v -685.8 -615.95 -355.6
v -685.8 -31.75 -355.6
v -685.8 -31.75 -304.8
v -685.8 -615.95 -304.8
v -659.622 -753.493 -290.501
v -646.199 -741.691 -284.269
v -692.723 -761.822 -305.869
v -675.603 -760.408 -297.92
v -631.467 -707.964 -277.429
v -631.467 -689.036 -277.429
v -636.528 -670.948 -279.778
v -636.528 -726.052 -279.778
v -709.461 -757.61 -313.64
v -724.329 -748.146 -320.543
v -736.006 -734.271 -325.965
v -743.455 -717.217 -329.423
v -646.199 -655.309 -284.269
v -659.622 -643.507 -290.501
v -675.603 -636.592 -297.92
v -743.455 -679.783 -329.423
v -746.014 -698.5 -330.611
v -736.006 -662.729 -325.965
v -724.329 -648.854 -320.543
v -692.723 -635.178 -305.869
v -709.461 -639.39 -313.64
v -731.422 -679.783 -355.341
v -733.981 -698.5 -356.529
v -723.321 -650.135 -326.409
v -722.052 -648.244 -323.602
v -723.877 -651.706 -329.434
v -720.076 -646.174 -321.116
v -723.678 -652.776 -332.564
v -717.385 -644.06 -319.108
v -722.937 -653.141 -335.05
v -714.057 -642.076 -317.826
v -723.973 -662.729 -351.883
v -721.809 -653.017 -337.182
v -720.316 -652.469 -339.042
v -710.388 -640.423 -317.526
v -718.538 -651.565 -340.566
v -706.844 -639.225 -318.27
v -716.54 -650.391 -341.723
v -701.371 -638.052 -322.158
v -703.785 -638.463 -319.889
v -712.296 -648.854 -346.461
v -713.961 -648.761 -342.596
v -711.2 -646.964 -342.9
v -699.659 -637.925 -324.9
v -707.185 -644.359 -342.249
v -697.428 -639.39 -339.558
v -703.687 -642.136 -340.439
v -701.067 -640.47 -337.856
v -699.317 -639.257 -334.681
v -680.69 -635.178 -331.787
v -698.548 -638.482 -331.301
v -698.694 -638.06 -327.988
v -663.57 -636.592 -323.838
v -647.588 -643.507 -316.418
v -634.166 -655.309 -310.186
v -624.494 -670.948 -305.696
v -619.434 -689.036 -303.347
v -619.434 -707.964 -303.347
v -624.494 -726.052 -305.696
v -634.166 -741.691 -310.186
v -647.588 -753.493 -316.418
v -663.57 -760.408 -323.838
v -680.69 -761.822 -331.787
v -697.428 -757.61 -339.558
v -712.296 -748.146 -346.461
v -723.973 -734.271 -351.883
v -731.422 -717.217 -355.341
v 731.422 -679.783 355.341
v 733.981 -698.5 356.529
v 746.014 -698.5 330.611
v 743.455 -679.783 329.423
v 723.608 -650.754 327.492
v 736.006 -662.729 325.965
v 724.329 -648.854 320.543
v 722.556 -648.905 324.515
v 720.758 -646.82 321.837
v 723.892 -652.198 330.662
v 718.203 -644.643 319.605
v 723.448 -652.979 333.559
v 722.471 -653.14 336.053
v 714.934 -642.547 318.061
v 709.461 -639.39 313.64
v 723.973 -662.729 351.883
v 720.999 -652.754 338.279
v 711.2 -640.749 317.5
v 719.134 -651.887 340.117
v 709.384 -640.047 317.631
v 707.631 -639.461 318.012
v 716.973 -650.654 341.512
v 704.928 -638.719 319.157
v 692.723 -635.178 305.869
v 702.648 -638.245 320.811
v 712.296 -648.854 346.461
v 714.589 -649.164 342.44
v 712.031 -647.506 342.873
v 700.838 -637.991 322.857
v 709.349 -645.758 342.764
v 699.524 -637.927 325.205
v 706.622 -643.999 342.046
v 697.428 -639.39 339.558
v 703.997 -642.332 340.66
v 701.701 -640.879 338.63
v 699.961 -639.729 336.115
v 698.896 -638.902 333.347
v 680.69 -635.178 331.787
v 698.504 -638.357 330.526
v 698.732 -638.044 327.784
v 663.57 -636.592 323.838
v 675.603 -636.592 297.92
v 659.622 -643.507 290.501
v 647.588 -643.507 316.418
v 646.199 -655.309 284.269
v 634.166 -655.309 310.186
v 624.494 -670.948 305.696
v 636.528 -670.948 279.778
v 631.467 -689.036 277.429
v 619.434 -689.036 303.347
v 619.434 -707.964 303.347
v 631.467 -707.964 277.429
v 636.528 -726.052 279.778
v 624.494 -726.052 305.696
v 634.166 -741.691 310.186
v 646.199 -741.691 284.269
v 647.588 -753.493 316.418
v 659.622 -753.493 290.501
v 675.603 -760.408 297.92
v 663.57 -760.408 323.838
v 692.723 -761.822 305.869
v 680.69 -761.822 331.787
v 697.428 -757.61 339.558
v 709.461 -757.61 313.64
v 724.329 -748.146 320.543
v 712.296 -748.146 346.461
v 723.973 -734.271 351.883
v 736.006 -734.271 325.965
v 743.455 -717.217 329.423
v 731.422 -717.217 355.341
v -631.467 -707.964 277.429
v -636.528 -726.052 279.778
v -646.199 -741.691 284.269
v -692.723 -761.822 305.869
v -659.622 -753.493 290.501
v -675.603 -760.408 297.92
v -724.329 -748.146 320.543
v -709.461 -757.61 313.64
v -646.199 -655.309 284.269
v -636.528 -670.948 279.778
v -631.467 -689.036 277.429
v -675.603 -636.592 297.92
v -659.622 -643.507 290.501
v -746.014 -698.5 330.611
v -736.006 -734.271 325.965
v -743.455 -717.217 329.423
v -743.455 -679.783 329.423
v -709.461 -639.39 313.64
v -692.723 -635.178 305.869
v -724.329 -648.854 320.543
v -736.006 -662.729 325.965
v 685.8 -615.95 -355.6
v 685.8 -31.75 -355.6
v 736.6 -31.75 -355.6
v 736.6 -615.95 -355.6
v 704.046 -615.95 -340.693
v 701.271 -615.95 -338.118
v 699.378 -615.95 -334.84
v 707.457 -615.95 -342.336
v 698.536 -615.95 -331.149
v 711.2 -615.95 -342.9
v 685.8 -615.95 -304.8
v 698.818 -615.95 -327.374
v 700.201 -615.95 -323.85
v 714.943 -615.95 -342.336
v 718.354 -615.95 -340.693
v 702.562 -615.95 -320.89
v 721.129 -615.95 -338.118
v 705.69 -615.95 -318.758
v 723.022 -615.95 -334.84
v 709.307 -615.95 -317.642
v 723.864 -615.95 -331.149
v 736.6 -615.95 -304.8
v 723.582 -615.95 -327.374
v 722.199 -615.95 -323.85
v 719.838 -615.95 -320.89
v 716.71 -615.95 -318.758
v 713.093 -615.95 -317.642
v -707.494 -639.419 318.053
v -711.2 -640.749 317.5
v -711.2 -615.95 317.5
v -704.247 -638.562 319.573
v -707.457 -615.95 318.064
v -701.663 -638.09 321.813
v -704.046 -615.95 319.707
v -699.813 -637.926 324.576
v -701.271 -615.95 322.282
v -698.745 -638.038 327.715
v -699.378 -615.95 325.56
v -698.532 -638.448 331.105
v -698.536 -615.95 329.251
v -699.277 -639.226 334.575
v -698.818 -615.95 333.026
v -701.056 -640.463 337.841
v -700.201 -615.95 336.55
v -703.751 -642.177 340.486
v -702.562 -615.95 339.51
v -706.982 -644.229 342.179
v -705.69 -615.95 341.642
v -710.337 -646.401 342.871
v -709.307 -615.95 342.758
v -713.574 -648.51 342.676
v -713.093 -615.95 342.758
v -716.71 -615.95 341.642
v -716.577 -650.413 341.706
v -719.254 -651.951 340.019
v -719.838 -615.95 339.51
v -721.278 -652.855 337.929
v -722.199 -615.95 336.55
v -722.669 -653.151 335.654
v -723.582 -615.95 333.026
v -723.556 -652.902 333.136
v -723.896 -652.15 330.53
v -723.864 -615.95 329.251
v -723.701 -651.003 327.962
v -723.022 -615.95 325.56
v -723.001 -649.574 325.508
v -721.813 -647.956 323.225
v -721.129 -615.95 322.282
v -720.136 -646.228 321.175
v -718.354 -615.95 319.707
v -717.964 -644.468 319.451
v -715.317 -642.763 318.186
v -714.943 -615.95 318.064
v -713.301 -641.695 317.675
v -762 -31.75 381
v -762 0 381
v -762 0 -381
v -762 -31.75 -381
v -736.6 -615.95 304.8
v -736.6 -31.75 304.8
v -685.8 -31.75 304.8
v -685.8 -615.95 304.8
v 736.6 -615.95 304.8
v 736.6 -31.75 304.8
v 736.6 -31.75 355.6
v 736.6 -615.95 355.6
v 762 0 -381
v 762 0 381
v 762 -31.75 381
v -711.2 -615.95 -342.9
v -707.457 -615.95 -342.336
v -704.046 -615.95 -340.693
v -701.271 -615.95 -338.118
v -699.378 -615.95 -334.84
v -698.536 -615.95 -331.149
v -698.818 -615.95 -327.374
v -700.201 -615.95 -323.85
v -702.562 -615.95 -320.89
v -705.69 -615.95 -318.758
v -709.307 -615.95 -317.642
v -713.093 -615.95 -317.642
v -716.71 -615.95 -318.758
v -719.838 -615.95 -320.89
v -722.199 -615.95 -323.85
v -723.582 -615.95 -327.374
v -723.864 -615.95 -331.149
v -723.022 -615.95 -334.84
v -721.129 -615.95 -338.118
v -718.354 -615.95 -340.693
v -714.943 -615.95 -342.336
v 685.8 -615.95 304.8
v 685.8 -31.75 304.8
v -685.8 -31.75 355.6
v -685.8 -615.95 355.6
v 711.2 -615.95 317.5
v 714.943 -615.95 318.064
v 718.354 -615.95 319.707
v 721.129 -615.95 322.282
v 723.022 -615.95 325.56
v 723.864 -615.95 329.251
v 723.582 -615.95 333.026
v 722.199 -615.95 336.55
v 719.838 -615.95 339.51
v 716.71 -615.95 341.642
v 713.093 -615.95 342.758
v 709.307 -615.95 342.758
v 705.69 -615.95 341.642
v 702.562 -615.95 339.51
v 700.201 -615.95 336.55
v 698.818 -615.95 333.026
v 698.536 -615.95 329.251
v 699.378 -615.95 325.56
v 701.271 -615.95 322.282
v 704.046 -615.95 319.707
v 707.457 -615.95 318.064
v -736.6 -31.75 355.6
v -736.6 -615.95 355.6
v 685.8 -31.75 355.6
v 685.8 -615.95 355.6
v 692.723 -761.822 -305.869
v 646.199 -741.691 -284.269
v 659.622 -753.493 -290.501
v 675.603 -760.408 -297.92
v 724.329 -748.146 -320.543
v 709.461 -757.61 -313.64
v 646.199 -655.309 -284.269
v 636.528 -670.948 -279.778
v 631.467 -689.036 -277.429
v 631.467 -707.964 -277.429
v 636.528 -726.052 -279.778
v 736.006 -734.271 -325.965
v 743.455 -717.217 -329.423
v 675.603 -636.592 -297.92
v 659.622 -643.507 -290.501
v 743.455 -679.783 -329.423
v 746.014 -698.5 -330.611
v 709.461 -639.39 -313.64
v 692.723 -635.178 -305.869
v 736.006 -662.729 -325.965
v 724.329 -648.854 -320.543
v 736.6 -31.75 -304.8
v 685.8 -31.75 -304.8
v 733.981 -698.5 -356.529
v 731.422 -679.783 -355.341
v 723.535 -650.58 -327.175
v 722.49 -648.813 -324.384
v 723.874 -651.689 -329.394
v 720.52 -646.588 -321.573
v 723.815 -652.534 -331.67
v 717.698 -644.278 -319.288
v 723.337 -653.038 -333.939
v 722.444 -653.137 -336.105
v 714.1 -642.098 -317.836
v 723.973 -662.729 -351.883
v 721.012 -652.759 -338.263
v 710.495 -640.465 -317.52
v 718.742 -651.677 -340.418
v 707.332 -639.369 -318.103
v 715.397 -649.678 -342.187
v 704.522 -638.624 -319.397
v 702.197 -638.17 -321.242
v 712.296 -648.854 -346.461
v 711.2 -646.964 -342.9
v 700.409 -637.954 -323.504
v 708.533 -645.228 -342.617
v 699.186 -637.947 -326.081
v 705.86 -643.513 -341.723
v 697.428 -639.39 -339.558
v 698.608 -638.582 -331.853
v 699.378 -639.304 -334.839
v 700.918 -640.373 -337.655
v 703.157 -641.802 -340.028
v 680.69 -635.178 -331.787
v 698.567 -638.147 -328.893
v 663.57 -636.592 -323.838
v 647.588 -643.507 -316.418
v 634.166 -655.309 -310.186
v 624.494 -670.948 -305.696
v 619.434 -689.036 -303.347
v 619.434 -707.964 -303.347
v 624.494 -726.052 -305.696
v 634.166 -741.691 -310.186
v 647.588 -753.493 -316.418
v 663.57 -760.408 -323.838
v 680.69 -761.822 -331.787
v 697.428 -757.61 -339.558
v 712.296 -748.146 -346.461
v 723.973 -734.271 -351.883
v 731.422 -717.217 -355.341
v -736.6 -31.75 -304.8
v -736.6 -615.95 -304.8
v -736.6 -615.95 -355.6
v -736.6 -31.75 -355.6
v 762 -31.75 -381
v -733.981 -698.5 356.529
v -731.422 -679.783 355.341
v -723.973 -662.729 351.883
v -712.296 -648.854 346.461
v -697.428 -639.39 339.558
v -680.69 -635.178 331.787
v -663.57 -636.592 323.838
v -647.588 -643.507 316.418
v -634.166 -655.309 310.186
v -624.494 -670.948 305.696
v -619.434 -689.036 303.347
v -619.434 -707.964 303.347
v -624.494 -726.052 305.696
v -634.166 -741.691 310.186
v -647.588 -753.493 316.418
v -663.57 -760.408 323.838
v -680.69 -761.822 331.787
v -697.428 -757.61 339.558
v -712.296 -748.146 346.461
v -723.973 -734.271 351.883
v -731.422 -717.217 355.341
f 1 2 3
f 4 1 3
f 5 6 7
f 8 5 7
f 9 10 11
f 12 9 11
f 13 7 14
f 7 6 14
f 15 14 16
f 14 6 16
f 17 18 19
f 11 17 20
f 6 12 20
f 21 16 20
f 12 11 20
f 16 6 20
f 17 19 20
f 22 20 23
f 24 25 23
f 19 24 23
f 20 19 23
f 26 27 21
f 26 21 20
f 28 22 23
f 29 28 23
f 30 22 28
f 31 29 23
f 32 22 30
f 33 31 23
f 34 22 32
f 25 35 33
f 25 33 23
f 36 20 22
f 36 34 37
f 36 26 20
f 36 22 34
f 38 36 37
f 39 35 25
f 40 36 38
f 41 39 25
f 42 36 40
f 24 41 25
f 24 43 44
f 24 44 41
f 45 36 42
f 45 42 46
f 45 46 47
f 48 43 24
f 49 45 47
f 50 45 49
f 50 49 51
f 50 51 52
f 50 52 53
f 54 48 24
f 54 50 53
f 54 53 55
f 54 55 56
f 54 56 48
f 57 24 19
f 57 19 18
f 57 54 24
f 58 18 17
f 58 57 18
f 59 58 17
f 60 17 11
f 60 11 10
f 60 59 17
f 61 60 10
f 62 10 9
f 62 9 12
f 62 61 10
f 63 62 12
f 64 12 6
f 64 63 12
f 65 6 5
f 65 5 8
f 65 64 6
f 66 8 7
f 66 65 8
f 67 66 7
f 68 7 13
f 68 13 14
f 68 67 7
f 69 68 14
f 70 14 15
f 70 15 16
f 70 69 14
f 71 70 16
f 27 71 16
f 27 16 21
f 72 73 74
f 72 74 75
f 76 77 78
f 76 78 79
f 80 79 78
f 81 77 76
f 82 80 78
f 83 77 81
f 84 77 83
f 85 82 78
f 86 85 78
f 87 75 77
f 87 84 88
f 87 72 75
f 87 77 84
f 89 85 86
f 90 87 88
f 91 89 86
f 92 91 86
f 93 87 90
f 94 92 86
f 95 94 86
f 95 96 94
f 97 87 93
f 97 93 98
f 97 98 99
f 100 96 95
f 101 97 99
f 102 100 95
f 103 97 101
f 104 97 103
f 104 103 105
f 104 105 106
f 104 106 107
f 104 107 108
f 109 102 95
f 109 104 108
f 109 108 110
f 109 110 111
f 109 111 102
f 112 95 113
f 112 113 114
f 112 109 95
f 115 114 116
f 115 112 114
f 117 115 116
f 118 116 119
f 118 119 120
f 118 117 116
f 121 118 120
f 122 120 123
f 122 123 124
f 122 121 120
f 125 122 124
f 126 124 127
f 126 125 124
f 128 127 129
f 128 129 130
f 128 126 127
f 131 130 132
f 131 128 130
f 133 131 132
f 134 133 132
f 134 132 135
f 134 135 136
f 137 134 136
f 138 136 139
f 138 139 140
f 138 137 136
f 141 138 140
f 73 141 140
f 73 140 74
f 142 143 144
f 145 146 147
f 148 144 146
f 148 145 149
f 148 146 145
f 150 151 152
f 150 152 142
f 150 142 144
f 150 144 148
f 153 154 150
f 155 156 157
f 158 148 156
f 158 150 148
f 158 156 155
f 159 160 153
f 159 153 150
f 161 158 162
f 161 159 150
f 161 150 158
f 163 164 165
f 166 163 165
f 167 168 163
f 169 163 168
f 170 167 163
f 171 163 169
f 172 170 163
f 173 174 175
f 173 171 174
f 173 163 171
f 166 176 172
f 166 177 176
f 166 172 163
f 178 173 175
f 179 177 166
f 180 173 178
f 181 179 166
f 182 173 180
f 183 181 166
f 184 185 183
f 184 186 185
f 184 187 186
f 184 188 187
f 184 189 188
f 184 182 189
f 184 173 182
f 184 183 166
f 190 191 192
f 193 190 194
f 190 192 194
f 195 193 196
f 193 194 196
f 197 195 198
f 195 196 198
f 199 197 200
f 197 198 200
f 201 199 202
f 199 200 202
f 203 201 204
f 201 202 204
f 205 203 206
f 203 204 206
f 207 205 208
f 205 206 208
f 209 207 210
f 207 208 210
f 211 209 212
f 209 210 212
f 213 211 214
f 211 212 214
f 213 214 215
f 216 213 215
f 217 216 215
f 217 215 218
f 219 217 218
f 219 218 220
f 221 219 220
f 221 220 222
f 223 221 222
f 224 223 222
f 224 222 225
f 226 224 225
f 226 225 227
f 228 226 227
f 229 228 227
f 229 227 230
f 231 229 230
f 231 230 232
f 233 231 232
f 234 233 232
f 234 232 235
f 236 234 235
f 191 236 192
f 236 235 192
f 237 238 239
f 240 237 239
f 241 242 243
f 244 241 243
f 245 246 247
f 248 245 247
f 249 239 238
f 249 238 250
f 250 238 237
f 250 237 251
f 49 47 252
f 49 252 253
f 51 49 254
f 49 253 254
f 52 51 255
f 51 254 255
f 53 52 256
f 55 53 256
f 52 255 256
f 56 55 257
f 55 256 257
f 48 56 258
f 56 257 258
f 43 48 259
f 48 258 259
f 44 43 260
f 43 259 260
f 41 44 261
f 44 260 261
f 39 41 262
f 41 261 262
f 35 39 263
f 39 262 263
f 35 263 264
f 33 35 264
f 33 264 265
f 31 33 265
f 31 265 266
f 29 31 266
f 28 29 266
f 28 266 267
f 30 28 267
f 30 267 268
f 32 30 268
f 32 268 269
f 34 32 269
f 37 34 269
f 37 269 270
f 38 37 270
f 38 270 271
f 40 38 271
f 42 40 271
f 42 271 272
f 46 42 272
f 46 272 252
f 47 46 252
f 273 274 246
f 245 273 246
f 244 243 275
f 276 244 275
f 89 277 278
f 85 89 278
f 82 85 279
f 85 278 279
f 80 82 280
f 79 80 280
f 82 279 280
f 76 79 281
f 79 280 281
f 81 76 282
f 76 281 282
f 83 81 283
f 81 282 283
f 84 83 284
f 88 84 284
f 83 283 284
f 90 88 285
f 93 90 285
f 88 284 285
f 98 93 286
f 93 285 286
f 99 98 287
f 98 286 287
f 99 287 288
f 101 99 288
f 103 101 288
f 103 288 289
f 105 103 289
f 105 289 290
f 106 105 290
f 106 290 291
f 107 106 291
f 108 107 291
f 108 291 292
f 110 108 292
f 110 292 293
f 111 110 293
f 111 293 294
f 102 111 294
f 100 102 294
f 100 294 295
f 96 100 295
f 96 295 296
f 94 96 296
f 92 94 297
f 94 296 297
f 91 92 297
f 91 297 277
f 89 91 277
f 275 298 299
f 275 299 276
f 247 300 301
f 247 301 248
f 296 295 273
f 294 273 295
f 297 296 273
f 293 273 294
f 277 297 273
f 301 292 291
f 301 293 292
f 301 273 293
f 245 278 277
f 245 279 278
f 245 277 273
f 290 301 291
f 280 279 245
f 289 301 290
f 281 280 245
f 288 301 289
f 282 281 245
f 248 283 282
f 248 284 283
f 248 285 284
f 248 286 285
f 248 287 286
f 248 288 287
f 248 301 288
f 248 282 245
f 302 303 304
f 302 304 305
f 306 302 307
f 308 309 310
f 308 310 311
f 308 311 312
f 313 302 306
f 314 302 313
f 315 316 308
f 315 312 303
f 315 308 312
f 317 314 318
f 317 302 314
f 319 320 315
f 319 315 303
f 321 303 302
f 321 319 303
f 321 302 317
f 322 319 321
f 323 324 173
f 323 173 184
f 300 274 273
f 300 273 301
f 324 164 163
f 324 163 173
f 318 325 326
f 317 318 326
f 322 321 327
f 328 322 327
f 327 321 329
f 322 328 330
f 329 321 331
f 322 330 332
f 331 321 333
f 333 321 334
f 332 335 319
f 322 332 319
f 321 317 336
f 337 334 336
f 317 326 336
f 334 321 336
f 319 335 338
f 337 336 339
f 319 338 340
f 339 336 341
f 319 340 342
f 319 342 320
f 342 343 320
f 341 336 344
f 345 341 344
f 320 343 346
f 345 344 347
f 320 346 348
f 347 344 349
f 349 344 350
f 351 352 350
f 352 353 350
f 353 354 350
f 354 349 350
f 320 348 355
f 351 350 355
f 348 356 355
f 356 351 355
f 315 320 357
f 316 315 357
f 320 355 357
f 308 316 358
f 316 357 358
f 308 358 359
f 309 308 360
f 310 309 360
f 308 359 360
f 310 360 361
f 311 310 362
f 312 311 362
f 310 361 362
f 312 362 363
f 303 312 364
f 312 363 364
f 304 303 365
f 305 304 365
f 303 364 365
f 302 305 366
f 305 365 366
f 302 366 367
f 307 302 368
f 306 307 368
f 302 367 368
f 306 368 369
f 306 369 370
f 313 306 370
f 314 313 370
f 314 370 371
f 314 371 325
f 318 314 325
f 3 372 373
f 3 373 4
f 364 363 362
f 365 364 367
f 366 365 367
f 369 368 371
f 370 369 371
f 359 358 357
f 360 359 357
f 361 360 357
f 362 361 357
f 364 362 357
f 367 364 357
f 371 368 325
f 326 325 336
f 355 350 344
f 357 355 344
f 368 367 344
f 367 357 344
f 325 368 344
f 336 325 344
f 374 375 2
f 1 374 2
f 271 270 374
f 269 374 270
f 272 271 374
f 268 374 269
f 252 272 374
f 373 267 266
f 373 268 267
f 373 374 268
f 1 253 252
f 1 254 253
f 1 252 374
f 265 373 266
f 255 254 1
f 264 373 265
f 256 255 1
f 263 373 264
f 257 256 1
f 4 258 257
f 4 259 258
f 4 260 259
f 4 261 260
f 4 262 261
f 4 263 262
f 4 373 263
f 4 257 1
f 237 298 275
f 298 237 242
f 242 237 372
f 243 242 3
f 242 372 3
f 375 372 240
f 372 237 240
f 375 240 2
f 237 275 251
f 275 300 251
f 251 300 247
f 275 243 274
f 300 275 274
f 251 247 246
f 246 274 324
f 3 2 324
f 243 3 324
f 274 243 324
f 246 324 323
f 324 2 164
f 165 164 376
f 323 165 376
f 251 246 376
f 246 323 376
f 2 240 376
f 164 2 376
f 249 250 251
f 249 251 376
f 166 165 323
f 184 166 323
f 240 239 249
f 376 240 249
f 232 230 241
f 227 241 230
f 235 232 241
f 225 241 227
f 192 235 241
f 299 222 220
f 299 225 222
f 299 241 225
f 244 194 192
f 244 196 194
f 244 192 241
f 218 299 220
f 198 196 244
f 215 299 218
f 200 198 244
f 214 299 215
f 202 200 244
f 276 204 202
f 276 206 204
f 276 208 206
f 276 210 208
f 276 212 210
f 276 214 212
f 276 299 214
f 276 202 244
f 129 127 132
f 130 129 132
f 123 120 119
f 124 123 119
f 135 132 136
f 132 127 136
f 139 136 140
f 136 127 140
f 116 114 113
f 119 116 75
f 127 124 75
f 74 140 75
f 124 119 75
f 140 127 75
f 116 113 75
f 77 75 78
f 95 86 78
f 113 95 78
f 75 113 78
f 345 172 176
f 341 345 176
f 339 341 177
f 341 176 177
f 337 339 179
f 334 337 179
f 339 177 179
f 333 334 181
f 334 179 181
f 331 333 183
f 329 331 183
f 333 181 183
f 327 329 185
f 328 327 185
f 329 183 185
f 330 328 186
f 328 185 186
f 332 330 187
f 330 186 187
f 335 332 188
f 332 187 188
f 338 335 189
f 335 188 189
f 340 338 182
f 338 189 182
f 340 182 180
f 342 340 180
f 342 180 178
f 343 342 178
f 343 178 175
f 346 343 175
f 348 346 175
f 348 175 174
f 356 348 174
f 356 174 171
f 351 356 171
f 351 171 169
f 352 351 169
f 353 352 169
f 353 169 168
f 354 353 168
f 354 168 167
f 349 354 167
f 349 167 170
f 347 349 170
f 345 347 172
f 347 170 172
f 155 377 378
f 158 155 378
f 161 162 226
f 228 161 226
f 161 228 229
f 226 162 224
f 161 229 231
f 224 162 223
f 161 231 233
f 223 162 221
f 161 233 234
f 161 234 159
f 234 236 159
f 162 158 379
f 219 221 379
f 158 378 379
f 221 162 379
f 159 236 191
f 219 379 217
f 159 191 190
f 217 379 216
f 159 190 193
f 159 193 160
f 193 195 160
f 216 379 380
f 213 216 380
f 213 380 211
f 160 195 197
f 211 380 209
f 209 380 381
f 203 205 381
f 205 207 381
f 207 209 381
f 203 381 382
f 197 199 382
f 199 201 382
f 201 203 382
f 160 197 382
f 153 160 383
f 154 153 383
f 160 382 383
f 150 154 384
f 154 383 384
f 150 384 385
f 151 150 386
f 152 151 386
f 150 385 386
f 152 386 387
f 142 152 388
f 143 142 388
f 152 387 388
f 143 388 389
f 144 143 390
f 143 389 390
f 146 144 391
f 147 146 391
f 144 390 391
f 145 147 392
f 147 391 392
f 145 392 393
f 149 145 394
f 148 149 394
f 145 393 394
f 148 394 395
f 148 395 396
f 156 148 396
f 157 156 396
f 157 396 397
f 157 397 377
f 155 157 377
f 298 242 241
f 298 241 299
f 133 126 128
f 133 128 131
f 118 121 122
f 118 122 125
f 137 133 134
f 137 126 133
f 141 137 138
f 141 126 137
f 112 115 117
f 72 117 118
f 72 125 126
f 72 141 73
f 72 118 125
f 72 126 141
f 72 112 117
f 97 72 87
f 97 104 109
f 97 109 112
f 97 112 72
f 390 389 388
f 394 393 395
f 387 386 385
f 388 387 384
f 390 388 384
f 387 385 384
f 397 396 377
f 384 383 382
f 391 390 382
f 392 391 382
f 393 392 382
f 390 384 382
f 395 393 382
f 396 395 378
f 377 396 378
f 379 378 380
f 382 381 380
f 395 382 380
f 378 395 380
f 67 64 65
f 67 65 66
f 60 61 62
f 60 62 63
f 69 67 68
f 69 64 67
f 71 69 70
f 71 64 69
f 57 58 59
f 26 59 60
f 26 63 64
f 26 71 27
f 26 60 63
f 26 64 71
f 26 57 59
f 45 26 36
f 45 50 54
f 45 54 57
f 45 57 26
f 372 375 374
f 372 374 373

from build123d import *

# Parameters (mm, degrees)
SKETCH1_W               = 1524
SKETCH1_H               = 762
BOSS_EXTRUDE1_DEPTH     = 31.75
SKETCH2_W               = 50.8
SKETCH2_H               = 50.8
BOSS_EXTRUDE2_DEPTH     = 584.2
SKETCH3_R               = 12.7
BOSS_EXTRUDE3_DEPTH     = 101.6
SKETCH4_R               = 63.5
BOSS_EXTRUDE4_DEPTH     = 14.2875
MIRROR2_COPY_1_SKETCH_R = 63.5
MIRROR2_COPY_1_DEPTH    = 14.2875


with BuildPart() as part:
    # Sketch1 → Boss-Extrude1 (new body)
    with BuildSketch(Plane(origin=(0, 0, 0), x_dir=(1, 0, 0), z_dir=(0, 1, 0))):
        Rectangle(SKETCH1_W, SKETCH1_H)
    extrude(amount=-BOSS_EXTRUDE1_DEPTH)

    # Sketch2 → Boss-Extrude2 (add)
    with BuildSketch(Plane.XZ.offset(31.75)):
        with Locations((-711.2, 330.2)):
            Rectangle(SKETCH2_W, SKETCH2_H)
        with Locations((-711.2, -330.2)):
            Rectangle(SKETCH2_W, SKETCH2_H)
        with Locations((711.2, -330.2)):
            Rectangle(SKETCH2_W, SKETCH2_H)
        with Locations((711.2, 330.2)):
            Rectangle(SKETCH2_W, SKETCH2_H)
    extrude(amount=BOSS_EXTRUDE2_DEPTH)

    # Sketch3 → Boss-Extrude3 (add)
    with BuildSketch(Plane.XZ.offset(615.95)):
        with Locations((711.2, 330.2)):
            Circle(SKETCH3_R)
        with Locations((711.2, -330.2)):
            Circle(SKETCH3_R)
        with Locations((-711.2, -330.2)):
            Circle(SKETCH3_R)
        with Locations((-711.2, 330.2)):
            Circle(SKETCH3_R)
    extrude(amount=BOSS_EXTRUDE3_DEPTH)

    # Sketch4 → Boss-Extrude4 (add, symmetric)
    with BuildSketch(Plane(origin=(0, 0, 0), x_dir=(0.9070089677484316, 0, 0.42111130645462913), z_dir=(-0.4211113064546291, 0, 0.9070089677484315))):
        with Locations((752.365731254, -698.5)):
            Circle(SKETCH4_R)
    boss_extrude4 = extrude(amount=BOSS_EXTRUDE4_DEPTH, both=True)

    # Mirror1: Boss-Extrude4 across plane
    add(boss_extrude4.mirror(Plane.XY))

    # Mirror2: Boss-Extrude4 across plane
    add(boss_extrude4.mirror(Plane(origin=(0, 0, 0), x_dir=(0, 0, 1), z_dir=(1, 0, 0))))

    # Mirror2 copy 1 sketch → Mirror2 copy 1 (add, symmetric)
    with BuildSketch(Plane(origin=(0, 0, 0), x_dir=(-0.9070089677484316, 0, -0.42111130645462913), z_dir=(0.4211113064546291, 0, -0.9070089677484315))):
        with Locations((752.365731254, -698.5)):
            Circle(MIRROR2_COPY_1_SKETCH_R)
    extrude(amount=MIRROR2_COPY_1_DEPTH, both=True)


solid = part.part
